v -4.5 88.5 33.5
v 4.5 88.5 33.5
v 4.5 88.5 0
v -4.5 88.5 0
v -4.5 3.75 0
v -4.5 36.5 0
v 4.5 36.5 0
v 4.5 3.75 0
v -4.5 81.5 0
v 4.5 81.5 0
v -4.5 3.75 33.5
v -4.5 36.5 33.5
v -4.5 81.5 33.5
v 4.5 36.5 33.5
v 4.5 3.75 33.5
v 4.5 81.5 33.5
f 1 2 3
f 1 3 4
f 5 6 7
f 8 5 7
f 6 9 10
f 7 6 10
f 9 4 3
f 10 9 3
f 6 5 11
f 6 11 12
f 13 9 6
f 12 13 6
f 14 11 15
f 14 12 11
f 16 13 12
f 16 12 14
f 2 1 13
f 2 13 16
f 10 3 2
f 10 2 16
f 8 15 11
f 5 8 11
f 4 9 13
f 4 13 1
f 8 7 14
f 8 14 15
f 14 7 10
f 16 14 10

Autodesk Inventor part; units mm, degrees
ref_plane "YZ Plane" through (0, 0, 0) normal (1, 0, 0) x (0, 1, 0)
ref_plane "XZ Plane" through (0, 0, 0) normal (0, 1, 0) x (-1, 0, 0)
ref_plane "Work Plane1" through (0, 0, 0) normal (0, 0, 1) x (1, 0, 0)
ref_plane "Work Plane2" through (-89, -40.3889, 33.5) normal (0, 0, 1) x (1, 0, 0)
sketch "Sketch1" plane through (0, 0, 0) normal (0, 0, 1) x (1, 0, 0)
  line L0 (23.5, 88.5) -> (-23.5, 88.5) projected
  line L1 (-23.5, 88.5) -> (-23.5, 36.5) projected
  line L2 (-26.5, 33.5) -> (-89, 33.5) projected
  line L3 (-89, 33.5) -> (-89, -72.5) projected
  line L4 (-89, -72.5) -> (-77, -72.5) projected
  line L5 (-74, -75.5) -> (-74, -93.5) projected
  line L6 (-74, -93.5) -> (74, -93.5) projected
  line L7 (74, -93.5) -> (74, -75.5) projected
  line L8 (77, -72.5) -> (89, -72.5) projected
  line L9 (89, -72.5) -> (89, 33.5) projected
  line L10 (89, 33.5) -> (26.5, 33.5) projected
  line L11 (23.5, 36.5) -> (23.5, 88.5) projected
  line L12 (-4.5, 81.5) -> (-4.5, 36.5) projected
  line L13 (-7.5, 33.5) -> (-13.5, 33.5) projected
  line L14 (-16.5, 36.5) -> (-16.5, 81.5) projected
  line L15 (-13.5, 84.5) -> (-7.5, 84.5) projected
  line L16 (16.5, 81.5) -> (16.5, 36.5) projected
  line L17 (13.5, 33.5) -> (7.5, 33.5) projected
  line L18 (4.5, 36.5) -> (4.5, 81.5) projected
  line L19 (7.5, 84.5) -> (13.5, 84.5) projected
  line L20 (-4.5, 88.5) -> (4.5, 88.5)
  line L21 (4.5, 88.5) -> (4.5, 3.75)
  line L22 (4.5, 3.75) -> (-4.5, 3.75)
  line L23 (-4.5, 3.75) -> (-4.5, 88.5)
  line L24 (-32.2, 4.75) -> (-59.9, 4.75)
  arc A0 (13.5, 33.5) -> (16.5, 36.5) centre (13.5, 36.5) ccw projected
  arc A1 (4.5, 36.5) -> (7.5, 33.5) centre (7.5, 36.5) ccw projected
  arc A2 (7.5, 84.5) -> (4.5, 81.5) centre (7.5, 81.5) ccw projected
  arc A3 (16.5, 81.5) -> (13.5, 84.5) centre (13.5, 81.5) ccw projected
  arc A4 (-4.5, 81.5) -> (-7.5, 84.5) centre (-7.5, 81.5) ccw projected
  arc A5 (-7.5, 33.5) -> (-4.5, 36.5) centre (-7.5, 36.5) ccw projected
  arc A6 (-16.5, 36.5) -> (-13.5, 33.5) centre (-13.5, 36.5) ccw projected
  arc A7 (-13.5, 84.5) -> (-16.5, 81.5) centre (-13.5, 81.5) ccw projected
  arc A8 (-26.5, 33.5) -> (-23.5, 36.5) centre (-26.5, 36.5) ccw projected
  arc A9 (-74, -75.5) -> (-77, -72.5) centre (-77, -75.5) ccw projected
  arc A10 (77, -72.5) -> (74, -75.5) centre (77, -75.5) ccw projected
  arc A11 (23.5, 36.5) -> (26.5, 33.5) centre (26.5, 36.5) ccw projected
  point P0 (0, 0)
  point P1 (-4.5, 81.5)
  point P2 (-4.5, 36.5)
  dimension "d0" = 1
extrude "Extrusion1" add sketch "Sketch1" along normal up to surface (33.5 mm away) contours L21 L18 L22 L23 L12 L0
properties part number "middle_gear_holder"
